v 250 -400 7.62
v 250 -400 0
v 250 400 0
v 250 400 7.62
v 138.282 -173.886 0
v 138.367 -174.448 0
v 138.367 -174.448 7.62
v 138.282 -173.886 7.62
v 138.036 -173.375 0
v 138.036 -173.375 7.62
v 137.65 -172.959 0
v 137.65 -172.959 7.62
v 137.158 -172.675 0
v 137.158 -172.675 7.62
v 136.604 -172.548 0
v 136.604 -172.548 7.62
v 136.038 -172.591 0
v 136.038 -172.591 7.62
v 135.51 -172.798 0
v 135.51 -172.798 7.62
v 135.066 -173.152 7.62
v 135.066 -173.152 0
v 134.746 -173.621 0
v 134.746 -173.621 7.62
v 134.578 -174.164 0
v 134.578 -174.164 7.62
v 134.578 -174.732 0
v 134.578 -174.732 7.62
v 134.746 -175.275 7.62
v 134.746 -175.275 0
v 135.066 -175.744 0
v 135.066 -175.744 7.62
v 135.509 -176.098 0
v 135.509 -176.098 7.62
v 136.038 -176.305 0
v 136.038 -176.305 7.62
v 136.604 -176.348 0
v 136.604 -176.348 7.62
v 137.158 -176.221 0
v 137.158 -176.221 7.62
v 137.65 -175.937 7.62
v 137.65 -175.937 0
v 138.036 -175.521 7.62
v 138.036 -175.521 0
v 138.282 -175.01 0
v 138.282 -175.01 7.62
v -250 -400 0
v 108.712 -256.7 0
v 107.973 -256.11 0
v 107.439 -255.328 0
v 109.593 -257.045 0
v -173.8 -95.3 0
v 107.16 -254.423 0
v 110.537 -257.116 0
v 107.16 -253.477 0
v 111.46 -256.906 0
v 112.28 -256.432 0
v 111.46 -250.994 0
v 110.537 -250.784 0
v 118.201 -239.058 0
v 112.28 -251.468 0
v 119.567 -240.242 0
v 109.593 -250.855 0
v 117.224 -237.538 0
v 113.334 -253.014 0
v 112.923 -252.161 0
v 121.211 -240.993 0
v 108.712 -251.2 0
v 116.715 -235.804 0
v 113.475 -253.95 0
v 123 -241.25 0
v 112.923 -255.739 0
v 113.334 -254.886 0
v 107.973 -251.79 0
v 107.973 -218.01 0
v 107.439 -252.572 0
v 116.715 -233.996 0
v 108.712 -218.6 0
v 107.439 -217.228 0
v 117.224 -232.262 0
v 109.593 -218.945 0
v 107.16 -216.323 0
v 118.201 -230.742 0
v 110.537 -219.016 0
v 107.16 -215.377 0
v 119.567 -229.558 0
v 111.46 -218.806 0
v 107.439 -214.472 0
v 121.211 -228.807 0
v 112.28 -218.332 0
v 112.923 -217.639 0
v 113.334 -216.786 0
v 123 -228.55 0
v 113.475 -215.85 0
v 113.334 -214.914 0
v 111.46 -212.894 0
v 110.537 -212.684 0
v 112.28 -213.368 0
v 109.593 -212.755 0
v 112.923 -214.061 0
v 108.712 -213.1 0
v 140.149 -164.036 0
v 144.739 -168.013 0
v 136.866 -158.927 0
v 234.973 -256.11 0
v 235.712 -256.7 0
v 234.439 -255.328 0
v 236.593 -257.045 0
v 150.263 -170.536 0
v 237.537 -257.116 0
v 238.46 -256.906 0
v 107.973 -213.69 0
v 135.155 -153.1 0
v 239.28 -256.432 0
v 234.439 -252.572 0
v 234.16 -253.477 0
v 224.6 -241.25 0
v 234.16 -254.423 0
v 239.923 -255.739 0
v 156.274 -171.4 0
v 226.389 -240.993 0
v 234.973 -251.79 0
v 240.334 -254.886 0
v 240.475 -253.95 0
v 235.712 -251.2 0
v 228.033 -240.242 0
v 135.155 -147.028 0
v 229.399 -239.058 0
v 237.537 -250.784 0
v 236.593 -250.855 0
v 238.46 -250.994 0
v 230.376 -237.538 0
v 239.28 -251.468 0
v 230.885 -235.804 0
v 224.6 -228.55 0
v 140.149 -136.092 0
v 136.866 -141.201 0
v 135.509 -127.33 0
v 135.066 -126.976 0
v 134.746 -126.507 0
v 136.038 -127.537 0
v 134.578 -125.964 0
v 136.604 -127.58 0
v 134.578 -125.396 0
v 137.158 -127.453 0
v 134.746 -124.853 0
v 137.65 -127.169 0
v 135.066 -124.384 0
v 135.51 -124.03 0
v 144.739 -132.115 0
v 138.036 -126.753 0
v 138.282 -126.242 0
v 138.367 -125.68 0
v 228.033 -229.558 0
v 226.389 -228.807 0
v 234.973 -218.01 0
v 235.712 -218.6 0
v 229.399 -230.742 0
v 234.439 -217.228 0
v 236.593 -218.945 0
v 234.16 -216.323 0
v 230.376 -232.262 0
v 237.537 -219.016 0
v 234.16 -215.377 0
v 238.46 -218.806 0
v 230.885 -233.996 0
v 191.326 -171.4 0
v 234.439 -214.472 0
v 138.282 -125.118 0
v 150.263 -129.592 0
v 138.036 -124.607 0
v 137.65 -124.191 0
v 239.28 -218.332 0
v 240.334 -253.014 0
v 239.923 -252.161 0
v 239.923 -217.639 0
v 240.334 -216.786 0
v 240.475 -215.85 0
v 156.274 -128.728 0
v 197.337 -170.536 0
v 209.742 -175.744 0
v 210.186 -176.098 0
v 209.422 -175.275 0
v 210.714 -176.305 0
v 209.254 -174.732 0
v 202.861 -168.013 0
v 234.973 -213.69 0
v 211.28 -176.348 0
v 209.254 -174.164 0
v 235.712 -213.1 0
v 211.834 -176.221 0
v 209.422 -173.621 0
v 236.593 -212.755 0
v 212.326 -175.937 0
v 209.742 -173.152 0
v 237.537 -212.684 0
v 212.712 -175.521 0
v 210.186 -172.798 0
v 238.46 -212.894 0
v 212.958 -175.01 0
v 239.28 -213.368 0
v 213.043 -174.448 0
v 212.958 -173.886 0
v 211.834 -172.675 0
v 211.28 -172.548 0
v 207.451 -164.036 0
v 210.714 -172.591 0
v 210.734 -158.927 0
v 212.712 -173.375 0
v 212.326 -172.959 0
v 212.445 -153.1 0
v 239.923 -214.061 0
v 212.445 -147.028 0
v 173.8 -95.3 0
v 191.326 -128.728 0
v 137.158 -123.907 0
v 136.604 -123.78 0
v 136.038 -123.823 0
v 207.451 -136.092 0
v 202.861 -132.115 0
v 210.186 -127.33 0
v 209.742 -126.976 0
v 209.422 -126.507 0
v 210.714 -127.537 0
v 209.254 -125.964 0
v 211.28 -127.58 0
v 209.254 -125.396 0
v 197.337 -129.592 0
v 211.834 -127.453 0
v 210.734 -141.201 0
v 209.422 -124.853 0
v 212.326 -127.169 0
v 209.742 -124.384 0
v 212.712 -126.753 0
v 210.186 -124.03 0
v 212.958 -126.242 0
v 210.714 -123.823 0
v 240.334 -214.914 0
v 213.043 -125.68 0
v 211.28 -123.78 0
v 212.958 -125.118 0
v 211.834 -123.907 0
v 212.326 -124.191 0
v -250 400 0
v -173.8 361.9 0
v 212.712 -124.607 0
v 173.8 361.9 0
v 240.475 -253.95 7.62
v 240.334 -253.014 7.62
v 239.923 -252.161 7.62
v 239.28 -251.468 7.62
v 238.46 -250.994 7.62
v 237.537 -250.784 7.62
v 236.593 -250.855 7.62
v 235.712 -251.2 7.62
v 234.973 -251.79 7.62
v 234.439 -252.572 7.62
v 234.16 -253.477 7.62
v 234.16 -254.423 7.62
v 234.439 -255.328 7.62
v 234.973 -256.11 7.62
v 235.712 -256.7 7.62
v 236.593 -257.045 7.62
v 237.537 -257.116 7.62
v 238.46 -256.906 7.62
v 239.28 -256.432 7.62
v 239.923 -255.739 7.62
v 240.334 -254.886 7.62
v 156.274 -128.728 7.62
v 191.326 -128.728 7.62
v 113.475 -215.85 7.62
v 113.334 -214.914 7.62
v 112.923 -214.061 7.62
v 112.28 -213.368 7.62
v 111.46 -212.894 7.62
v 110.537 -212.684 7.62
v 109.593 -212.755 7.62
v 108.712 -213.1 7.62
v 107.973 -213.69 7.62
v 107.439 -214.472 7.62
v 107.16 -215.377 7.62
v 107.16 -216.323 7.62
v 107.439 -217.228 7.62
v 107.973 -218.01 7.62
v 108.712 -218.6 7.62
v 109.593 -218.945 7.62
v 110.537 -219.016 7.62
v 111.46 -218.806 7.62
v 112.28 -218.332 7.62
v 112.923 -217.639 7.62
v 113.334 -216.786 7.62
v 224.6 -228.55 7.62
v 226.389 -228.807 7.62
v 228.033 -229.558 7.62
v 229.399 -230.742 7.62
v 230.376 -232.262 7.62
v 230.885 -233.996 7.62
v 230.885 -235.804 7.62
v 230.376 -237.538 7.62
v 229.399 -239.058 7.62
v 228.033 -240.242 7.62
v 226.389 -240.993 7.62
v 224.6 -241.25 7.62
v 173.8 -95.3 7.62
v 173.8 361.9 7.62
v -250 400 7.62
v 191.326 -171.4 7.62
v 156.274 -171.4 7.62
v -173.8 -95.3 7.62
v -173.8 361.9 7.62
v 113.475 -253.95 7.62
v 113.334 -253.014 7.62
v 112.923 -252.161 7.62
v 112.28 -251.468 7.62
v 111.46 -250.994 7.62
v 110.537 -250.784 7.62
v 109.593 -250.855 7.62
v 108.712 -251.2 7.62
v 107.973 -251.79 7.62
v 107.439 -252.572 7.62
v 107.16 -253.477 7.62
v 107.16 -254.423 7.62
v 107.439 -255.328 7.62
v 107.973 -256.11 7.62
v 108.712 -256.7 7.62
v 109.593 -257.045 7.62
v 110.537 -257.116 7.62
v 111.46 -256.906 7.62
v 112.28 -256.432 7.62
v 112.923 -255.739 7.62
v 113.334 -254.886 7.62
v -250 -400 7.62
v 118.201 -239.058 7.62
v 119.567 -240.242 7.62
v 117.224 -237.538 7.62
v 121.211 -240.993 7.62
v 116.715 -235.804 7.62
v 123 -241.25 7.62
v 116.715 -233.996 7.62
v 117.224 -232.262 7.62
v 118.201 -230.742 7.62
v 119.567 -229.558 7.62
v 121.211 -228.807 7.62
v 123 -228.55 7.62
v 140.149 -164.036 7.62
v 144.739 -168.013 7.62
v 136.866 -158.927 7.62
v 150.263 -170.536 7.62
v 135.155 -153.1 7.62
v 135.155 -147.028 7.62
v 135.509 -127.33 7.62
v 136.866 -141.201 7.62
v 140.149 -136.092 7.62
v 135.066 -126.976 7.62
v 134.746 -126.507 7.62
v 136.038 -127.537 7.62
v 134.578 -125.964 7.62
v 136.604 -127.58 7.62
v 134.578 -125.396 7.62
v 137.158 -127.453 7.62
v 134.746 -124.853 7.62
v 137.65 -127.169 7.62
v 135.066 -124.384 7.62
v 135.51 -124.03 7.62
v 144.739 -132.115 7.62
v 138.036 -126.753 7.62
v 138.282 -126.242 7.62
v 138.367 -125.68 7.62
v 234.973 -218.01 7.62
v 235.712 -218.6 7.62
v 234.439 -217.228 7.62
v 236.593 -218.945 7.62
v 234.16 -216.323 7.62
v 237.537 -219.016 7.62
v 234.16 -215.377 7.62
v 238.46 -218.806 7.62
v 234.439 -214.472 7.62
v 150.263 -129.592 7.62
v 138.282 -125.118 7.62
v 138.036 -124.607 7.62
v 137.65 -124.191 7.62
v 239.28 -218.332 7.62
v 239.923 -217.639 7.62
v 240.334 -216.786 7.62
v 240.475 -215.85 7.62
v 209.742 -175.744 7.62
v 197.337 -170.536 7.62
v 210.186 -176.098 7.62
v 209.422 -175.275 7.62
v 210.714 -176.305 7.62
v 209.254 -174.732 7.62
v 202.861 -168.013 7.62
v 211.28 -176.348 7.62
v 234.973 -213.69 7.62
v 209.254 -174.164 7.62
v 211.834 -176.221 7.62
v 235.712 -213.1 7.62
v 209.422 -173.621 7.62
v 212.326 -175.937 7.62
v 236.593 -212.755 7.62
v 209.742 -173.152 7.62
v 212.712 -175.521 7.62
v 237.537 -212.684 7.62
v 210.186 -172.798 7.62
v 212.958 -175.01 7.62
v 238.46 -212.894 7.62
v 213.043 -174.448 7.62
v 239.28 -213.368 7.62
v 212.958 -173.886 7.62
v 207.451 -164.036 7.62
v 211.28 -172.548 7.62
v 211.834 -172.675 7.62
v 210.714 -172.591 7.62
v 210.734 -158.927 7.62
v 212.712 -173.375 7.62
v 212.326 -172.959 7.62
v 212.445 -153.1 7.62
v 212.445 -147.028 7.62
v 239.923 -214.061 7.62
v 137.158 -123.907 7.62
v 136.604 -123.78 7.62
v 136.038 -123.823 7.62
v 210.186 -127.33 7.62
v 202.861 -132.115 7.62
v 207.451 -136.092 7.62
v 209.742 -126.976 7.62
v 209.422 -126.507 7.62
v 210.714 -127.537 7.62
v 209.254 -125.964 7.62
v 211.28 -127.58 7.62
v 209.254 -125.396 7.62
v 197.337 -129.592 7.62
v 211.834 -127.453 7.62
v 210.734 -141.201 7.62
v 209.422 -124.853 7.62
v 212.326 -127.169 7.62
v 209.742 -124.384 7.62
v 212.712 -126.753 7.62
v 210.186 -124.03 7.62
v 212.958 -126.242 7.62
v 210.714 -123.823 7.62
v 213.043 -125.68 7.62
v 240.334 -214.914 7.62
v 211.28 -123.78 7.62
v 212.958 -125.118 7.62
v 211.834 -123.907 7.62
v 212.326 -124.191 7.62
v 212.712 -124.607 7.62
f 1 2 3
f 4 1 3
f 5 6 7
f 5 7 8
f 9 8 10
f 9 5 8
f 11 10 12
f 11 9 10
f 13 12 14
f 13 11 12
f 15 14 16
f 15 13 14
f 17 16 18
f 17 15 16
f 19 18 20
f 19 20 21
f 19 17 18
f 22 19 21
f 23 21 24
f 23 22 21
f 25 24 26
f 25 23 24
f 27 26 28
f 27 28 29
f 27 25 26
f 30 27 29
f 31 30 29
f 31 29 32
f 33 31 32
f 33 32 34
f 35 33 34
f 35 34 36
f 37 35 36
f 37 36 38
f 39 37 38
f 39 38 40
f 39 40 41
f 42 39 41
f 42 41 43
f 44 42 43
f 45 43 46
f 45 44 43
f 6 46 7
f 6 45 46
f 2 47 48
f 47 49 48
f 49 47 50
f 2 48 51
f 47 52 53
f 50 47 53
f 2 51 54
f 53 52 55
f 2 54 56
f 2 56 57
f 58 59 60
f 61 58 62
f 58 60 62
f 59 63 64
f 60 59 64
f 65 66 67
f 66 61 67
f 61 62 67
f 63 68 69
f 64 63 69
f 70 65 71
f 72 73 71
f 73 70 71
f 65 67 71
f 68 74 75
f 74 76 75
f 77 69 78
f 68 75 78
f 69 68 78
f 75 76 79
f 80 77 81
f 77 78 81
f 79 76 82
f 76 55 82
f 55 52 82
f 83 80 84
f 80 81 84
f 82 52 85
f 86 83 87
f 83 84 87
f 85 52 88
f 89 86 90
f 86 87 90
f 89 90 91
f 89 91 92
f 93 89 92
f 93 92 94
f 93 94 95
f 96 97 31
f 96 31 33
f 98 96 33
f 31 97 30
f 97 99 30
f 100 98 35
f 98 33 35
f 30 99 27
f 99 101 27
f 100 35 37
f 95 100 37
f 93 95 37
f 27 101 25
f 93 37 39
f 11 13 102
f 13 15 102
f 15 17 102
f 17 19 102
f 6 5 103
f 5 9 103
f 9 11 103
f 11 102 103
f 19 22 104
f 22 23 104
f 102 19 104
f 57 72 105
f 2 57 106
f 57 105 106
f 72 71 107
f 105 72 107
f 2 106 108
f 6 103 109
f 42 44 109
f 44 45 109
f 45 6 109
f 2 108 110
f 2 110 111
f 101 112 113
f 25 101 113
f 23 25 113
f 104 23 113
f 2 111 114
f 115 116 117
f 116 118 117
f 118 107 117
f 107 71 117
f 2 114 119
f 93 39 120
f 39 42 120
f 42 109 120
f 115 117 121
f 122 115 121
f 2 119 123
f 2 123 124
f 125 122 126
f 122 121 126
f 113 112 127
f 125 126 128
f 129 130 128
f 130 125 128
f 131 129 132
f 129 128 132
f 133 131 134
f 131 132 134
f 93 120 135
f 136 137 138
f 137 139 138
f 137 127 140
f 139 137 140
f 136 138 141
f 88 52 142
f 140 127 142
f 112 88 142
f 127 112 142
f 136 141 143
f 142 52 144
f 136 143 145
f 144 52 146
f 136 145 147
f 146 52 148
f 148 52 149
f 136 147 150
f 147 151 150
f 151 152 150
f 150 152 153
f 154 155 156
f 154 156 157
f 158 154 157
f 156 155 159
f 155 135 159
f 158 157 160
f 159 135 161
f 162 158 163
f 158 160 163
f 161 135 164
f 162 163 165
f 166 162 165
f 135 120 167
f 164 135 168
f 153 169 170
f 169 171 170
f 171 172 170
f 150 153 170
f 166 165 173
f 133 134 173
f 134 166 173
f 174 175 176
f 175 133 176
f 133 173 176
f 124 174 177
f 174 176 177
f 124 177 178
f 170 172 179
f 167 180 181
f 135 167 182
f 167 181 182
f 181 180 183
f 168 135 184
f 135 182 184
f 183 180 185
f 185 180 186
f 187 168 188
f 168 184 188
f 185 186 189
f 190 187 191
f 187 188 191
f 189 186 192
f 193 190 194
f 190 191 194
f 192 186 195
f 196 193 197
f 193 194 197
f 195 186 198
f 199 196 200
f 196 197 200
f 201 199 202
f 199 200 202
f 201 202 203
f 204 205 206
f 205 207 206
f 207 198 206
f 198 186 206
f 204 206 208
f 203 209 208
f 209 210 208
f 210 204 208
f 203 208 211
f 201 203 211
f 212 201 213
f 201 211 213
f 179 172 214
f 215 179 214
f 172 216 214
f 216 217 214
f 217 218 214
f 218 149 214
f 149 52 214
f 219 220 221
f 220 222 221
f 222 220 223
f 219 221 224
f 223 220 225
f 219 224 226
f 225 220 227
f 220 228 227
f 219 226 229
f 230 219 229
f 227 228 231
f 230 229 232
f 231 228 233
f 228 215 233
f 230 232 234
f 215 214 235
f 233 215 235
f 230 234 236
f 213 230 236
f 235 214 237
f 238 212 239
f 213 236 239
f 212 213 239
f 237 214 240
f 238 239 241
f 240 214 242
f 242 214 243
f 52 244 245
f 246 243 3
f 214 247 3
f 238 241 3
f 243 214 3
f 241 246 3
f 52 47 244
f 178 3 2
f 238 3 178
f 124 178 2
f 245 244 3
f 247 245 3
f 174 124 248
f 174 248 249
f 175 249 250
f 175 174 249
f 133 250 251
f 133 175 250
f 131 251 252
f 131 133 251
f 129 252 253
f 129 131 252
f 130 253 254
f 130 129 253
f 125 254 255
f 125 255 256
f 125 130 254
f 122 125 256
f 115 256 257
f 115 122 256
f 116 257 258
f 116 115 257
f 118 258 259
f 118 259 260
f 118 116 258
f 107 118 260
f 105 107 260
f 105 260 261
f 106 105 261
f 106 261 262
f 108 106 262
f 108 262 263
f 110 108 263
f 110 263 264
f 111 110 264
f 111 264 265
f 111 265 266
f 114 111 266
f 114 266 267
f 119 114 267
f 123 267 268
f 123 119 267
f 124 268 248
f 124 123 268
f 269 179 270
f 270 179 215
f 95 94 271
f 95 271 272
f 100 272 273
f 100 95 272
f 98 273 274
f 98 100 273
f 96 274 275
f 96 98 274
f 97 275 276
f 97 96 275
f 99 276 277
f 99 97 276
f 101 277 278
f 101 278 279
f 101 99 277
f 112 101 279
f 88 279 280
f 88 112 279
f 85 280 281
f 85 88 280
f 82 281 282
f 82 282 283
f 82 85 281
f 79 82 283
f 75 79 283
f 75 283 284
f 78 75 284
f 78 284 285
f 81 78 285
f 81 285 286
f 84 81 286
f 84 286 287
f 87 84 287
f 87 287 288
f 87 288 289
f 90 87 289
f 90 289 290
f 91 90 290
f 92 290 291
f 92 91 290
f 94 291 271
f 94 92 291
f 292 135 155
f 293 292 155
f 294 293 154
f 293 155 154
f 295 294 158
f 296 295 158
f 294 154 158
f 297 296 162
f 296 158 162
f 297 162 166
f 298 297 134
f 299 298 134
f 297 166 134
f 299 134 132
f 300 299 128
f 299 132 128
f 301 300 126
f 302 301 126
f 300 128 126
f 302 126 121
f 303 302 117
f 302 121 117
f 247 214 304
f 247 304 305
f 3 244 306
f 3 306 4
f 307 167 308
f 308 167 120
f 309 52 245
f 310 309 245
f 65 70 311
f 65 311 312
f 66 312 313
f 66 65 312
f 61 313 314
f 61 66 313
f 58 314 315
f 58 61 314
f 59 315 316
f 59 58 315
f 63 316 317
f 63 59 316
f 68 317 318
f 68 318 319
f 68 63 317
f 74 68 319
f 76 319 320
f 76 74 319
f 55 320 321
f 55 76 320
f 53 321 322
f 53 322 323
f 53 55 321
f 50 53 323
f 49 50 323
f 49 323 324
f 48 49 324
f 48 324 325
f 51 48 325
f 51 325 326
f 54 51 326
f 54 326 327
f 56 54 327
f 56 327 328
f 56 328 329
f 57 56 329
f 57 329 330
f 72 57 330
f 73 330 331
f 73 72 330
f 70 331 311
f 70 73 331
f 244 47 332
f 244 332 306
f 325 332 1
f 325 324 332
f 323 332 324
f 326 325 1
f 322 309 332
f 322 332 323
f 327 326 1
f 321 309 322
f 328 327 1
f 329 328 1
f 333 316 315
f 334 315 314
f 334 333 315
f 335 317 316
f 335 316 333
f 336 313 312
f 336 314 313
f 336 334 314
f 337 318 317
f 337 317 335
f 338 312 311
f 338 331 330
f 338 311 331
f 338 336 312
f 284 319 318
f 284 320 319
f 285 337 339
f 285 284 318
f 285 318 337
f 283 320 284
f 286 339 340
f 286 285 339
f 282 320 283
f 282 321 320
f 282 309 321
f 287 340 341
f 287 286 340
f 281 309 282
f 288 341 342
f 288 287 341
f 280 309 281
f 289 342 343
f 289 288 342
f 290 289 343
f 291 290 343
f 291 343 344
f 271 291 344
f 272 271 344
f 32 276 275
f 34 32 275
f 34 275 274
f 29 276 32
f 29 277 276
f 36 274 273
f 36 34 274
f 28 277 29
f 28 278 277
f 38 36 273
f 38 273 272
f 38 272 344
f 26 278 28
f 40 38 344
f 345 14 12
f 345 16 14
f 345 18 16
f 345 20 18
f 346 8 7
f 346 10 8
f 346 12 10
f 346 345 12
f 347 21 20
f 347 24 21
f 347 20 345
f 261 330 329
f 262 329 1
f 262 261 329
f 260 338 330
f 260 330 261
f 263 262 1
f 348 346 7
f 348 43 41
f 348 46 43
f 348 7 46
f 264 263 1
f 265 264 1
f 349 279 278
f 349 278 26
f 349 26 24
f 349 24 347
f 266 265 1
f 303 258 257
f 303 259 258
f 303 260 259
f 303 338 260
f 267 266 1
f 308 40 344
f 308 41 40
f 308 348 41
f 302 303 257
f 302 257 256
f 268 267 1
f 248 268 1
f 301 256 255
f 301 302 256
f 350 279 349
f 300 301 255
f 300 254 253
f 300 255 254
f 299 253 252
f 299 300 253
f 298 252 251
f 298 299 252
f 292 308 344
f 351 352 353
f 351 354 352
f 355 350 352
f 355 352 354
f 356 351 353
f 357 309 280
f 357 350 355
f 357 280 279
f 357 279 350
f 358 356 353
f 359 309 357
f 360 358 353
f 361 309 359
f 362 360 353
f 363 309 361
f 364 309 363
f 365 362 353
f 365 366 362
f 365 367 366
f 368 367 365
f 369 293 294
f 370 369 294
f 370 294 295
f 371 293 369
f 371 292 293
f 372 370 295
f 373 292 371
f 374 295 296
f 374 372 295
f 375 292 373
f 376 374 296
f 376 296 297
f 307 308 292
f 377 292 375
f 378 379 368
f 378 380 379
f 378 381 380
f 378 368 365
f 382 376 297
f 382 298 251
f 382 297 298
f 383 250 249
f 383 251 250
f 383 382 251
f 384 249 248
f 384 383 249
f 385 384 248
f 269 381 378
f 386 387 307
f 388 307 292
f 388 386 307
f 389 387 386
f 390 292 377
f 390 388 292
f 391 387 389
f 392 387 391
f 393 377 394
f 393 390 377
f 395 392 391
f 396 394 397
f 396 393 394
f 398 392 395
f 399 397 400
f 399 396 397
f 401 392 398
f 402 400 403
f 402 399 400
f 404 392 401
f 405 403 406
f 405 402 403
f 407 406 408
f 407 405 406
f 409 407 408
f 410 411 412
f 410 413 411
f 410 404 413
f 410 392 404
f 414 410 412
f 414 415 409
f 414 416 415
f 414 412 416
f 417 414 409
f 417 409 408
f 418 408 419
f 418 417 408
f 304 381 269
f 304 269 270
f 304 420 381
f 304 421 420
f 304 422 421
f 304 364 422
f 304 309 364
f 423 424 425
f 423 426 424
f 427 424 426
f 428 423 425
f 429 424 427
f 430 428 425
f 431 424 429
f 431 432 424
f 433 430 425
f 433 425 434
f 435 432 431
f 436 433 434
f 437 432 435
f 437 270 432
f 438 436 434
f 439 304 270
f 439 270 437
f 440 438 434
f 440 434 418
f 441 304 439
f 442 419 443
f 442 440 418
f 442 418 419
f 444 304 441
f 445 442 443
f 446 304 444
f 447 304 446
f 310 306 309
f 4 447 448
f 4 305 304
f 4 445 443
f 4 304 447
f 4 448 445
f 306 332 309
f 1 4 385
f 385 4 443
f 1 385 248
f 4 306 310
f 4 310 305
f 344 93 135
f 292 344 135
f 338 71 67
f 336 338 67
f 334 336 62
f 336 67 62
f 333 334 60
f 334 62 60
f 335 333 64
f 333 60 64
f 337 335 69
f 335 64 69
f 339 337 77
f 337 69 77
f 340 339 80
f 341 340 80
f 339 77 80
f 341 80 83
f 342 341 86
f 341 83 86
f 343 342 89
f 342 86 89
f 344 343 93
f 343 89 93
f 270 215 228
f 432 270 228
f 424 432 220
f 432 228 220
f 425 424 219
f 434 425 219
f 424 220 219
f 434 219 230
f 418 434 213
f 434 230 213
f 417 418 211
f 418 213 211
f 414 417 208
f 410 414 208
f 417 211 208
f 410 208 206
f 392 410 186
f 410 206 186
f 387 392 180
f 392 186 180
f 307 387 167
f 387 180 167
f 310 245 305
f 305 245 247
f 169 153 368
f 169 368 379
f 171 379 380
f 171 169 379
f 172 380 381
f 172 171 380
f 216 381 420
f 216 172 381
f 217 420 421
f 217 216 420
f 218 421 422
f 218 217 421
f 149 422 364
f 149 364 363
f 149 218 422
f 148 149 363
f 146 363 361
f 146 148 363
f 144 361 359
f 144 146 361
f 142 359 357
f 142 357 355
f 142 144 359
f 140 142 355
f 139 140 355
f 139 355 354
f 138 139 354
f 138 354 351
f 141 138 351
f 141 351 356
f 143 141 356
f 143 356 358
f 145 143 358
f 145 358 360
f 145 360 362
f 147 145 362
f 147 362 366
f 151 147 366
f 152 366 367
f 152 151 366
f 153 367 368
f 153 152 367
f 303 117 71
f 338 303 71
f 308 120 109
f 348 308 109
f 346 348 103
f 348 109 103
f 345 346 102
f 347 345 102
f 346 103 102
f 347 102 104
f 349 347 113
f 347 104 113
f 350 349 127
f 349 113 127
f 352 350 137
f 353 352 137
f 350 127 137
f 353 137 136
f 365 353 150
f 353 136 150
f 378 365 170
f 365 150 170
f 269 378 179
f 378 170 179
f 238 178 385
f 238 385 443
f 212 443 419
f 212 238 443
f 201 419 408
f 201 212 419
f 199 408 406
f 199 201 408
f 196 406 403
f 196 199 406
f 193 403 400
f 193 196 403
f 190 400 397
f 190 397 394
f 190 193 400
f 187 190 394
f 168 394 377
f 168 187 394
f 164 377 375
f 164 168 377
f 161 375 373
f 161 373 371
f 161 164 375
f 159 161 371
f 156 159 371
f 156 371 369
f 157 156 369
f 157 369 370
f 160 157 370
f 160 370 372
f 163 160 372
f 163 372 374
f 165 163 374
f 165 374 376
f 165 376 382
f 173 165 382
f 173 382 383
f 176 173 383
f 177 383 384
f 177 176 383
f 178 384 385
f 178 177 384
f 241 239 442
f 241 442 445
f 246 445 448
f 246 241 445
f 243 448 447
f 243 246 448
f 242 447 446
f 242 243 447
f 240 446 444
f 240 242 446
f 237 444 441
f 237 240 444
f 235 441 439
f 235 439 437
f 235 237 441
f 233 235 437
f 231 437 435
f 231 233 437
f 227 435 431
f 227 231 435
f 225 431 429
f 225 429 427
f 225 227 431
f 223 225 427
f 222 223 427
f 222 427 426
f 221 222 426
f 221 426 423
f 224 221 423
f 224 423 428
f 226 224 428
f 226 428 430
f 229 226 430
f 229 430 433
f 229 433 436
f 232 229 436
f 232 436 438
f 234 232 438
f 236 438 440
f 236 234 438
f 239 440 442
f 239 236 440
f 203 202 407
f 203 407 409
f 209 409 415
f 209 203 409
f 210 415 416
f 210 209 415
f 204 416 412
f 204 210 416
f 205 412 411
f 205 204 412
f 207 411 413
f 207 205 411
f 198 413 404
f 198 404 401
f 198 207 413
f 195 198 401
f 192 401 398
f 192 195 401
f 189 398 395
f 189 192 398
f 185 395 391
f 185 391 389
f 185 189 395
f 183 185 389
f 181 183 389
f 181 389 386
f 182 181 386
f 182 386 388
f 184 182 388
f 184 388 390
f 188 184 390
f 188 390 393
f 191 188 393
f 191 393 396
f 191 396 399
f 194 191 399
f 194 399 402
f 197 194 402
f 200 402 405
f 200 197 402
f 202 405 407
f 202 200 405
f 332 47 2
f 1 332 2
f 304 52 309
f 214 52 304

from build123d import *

# Parameters (mm, degrees)
SKETCH1_W           = 500
SKETCH1_H           = 800
SKETCH1_R           = 1.905
SKETCH1_R_2         = 3.175
SKETCH1_W_2         = 347.6
SKETCH1_H_2         = 457.2
BOSS_EXTRUDE1_DEPTH = 7.62


with BuildPart() as part:
    # Sketch1 → Boss-Extrude1 (new body)
    with BuildSketch(Plane.XY):
        Rectangle(SKETCH1_W, SKETCH1_H)
        with Locations((136.462, -125.68)):
            Circle(SKETCH1_R, mode=Mode.SUBTRACT)
        with Locations((211.138, -125.68)):
            Circle(SKETCH1_R, mode=Mode.SUBTRACT)
        with Locations((211.138, -174.448)):
            Circle(SKETCH1_R, mode=Mode.SUBTRACT)
        with Locations((136.462, -174.448)):
            Circle(SKETCH1_R, mode=Mode.SUBTRACT)
        with Locations((237.3, -215.85)):
            Circle(SKETCH1_R_2, mode=Mode.SUBTRACT)
        with Locations((110.3, -215.85)):
            Circle(SKETCH1_R_2, mode=Mode.SUBTRACT)
        with Locations((237.3, -253.95)):
            Circle(SKETCH1_R_2, mode=Mode.SUBTRACT)
        with Locations((110.3, -253.95)):
            Circle(SKETCH1_R_2, mode=Mode.SUBTRACT)
        with Locations((0, 133.3)):
            Rectangle(SKETCH1_W_2, SKETCH1_H_2, mode=Mode.SUBTRACT)
        with BuildLine():
            Line((156.274, -128.728), (191.326, -128.728))
            ThreePointArc((191.326, -128.728), (212.662, -150.064), (191.326, -171.4))
            Line((191.326, -171.4), (156.274, -171.4))
            ThreePointArc((156.274, -171.4), (134.938, -150.064), (156.274, -128.728))
        make_face(mode=Mode.SUBTRACT)
        with BuildLine():
            Line((224.6, -241.25), (123, -241.25))
            ThreePointArc((123, -241.25), (116.65, -234.9), (123, -228.55))
            Line((123, -228.55), (224.6, -228.55))
            ThreePointArc((224.6, -228.55), (230.95, -234.9), (224.6, -241.25))
        make_face(mode=Mode.SUBTRACT)
    extrude(amount=BOSS_EXTRUDE1_DEPTH)


solid = part.part
